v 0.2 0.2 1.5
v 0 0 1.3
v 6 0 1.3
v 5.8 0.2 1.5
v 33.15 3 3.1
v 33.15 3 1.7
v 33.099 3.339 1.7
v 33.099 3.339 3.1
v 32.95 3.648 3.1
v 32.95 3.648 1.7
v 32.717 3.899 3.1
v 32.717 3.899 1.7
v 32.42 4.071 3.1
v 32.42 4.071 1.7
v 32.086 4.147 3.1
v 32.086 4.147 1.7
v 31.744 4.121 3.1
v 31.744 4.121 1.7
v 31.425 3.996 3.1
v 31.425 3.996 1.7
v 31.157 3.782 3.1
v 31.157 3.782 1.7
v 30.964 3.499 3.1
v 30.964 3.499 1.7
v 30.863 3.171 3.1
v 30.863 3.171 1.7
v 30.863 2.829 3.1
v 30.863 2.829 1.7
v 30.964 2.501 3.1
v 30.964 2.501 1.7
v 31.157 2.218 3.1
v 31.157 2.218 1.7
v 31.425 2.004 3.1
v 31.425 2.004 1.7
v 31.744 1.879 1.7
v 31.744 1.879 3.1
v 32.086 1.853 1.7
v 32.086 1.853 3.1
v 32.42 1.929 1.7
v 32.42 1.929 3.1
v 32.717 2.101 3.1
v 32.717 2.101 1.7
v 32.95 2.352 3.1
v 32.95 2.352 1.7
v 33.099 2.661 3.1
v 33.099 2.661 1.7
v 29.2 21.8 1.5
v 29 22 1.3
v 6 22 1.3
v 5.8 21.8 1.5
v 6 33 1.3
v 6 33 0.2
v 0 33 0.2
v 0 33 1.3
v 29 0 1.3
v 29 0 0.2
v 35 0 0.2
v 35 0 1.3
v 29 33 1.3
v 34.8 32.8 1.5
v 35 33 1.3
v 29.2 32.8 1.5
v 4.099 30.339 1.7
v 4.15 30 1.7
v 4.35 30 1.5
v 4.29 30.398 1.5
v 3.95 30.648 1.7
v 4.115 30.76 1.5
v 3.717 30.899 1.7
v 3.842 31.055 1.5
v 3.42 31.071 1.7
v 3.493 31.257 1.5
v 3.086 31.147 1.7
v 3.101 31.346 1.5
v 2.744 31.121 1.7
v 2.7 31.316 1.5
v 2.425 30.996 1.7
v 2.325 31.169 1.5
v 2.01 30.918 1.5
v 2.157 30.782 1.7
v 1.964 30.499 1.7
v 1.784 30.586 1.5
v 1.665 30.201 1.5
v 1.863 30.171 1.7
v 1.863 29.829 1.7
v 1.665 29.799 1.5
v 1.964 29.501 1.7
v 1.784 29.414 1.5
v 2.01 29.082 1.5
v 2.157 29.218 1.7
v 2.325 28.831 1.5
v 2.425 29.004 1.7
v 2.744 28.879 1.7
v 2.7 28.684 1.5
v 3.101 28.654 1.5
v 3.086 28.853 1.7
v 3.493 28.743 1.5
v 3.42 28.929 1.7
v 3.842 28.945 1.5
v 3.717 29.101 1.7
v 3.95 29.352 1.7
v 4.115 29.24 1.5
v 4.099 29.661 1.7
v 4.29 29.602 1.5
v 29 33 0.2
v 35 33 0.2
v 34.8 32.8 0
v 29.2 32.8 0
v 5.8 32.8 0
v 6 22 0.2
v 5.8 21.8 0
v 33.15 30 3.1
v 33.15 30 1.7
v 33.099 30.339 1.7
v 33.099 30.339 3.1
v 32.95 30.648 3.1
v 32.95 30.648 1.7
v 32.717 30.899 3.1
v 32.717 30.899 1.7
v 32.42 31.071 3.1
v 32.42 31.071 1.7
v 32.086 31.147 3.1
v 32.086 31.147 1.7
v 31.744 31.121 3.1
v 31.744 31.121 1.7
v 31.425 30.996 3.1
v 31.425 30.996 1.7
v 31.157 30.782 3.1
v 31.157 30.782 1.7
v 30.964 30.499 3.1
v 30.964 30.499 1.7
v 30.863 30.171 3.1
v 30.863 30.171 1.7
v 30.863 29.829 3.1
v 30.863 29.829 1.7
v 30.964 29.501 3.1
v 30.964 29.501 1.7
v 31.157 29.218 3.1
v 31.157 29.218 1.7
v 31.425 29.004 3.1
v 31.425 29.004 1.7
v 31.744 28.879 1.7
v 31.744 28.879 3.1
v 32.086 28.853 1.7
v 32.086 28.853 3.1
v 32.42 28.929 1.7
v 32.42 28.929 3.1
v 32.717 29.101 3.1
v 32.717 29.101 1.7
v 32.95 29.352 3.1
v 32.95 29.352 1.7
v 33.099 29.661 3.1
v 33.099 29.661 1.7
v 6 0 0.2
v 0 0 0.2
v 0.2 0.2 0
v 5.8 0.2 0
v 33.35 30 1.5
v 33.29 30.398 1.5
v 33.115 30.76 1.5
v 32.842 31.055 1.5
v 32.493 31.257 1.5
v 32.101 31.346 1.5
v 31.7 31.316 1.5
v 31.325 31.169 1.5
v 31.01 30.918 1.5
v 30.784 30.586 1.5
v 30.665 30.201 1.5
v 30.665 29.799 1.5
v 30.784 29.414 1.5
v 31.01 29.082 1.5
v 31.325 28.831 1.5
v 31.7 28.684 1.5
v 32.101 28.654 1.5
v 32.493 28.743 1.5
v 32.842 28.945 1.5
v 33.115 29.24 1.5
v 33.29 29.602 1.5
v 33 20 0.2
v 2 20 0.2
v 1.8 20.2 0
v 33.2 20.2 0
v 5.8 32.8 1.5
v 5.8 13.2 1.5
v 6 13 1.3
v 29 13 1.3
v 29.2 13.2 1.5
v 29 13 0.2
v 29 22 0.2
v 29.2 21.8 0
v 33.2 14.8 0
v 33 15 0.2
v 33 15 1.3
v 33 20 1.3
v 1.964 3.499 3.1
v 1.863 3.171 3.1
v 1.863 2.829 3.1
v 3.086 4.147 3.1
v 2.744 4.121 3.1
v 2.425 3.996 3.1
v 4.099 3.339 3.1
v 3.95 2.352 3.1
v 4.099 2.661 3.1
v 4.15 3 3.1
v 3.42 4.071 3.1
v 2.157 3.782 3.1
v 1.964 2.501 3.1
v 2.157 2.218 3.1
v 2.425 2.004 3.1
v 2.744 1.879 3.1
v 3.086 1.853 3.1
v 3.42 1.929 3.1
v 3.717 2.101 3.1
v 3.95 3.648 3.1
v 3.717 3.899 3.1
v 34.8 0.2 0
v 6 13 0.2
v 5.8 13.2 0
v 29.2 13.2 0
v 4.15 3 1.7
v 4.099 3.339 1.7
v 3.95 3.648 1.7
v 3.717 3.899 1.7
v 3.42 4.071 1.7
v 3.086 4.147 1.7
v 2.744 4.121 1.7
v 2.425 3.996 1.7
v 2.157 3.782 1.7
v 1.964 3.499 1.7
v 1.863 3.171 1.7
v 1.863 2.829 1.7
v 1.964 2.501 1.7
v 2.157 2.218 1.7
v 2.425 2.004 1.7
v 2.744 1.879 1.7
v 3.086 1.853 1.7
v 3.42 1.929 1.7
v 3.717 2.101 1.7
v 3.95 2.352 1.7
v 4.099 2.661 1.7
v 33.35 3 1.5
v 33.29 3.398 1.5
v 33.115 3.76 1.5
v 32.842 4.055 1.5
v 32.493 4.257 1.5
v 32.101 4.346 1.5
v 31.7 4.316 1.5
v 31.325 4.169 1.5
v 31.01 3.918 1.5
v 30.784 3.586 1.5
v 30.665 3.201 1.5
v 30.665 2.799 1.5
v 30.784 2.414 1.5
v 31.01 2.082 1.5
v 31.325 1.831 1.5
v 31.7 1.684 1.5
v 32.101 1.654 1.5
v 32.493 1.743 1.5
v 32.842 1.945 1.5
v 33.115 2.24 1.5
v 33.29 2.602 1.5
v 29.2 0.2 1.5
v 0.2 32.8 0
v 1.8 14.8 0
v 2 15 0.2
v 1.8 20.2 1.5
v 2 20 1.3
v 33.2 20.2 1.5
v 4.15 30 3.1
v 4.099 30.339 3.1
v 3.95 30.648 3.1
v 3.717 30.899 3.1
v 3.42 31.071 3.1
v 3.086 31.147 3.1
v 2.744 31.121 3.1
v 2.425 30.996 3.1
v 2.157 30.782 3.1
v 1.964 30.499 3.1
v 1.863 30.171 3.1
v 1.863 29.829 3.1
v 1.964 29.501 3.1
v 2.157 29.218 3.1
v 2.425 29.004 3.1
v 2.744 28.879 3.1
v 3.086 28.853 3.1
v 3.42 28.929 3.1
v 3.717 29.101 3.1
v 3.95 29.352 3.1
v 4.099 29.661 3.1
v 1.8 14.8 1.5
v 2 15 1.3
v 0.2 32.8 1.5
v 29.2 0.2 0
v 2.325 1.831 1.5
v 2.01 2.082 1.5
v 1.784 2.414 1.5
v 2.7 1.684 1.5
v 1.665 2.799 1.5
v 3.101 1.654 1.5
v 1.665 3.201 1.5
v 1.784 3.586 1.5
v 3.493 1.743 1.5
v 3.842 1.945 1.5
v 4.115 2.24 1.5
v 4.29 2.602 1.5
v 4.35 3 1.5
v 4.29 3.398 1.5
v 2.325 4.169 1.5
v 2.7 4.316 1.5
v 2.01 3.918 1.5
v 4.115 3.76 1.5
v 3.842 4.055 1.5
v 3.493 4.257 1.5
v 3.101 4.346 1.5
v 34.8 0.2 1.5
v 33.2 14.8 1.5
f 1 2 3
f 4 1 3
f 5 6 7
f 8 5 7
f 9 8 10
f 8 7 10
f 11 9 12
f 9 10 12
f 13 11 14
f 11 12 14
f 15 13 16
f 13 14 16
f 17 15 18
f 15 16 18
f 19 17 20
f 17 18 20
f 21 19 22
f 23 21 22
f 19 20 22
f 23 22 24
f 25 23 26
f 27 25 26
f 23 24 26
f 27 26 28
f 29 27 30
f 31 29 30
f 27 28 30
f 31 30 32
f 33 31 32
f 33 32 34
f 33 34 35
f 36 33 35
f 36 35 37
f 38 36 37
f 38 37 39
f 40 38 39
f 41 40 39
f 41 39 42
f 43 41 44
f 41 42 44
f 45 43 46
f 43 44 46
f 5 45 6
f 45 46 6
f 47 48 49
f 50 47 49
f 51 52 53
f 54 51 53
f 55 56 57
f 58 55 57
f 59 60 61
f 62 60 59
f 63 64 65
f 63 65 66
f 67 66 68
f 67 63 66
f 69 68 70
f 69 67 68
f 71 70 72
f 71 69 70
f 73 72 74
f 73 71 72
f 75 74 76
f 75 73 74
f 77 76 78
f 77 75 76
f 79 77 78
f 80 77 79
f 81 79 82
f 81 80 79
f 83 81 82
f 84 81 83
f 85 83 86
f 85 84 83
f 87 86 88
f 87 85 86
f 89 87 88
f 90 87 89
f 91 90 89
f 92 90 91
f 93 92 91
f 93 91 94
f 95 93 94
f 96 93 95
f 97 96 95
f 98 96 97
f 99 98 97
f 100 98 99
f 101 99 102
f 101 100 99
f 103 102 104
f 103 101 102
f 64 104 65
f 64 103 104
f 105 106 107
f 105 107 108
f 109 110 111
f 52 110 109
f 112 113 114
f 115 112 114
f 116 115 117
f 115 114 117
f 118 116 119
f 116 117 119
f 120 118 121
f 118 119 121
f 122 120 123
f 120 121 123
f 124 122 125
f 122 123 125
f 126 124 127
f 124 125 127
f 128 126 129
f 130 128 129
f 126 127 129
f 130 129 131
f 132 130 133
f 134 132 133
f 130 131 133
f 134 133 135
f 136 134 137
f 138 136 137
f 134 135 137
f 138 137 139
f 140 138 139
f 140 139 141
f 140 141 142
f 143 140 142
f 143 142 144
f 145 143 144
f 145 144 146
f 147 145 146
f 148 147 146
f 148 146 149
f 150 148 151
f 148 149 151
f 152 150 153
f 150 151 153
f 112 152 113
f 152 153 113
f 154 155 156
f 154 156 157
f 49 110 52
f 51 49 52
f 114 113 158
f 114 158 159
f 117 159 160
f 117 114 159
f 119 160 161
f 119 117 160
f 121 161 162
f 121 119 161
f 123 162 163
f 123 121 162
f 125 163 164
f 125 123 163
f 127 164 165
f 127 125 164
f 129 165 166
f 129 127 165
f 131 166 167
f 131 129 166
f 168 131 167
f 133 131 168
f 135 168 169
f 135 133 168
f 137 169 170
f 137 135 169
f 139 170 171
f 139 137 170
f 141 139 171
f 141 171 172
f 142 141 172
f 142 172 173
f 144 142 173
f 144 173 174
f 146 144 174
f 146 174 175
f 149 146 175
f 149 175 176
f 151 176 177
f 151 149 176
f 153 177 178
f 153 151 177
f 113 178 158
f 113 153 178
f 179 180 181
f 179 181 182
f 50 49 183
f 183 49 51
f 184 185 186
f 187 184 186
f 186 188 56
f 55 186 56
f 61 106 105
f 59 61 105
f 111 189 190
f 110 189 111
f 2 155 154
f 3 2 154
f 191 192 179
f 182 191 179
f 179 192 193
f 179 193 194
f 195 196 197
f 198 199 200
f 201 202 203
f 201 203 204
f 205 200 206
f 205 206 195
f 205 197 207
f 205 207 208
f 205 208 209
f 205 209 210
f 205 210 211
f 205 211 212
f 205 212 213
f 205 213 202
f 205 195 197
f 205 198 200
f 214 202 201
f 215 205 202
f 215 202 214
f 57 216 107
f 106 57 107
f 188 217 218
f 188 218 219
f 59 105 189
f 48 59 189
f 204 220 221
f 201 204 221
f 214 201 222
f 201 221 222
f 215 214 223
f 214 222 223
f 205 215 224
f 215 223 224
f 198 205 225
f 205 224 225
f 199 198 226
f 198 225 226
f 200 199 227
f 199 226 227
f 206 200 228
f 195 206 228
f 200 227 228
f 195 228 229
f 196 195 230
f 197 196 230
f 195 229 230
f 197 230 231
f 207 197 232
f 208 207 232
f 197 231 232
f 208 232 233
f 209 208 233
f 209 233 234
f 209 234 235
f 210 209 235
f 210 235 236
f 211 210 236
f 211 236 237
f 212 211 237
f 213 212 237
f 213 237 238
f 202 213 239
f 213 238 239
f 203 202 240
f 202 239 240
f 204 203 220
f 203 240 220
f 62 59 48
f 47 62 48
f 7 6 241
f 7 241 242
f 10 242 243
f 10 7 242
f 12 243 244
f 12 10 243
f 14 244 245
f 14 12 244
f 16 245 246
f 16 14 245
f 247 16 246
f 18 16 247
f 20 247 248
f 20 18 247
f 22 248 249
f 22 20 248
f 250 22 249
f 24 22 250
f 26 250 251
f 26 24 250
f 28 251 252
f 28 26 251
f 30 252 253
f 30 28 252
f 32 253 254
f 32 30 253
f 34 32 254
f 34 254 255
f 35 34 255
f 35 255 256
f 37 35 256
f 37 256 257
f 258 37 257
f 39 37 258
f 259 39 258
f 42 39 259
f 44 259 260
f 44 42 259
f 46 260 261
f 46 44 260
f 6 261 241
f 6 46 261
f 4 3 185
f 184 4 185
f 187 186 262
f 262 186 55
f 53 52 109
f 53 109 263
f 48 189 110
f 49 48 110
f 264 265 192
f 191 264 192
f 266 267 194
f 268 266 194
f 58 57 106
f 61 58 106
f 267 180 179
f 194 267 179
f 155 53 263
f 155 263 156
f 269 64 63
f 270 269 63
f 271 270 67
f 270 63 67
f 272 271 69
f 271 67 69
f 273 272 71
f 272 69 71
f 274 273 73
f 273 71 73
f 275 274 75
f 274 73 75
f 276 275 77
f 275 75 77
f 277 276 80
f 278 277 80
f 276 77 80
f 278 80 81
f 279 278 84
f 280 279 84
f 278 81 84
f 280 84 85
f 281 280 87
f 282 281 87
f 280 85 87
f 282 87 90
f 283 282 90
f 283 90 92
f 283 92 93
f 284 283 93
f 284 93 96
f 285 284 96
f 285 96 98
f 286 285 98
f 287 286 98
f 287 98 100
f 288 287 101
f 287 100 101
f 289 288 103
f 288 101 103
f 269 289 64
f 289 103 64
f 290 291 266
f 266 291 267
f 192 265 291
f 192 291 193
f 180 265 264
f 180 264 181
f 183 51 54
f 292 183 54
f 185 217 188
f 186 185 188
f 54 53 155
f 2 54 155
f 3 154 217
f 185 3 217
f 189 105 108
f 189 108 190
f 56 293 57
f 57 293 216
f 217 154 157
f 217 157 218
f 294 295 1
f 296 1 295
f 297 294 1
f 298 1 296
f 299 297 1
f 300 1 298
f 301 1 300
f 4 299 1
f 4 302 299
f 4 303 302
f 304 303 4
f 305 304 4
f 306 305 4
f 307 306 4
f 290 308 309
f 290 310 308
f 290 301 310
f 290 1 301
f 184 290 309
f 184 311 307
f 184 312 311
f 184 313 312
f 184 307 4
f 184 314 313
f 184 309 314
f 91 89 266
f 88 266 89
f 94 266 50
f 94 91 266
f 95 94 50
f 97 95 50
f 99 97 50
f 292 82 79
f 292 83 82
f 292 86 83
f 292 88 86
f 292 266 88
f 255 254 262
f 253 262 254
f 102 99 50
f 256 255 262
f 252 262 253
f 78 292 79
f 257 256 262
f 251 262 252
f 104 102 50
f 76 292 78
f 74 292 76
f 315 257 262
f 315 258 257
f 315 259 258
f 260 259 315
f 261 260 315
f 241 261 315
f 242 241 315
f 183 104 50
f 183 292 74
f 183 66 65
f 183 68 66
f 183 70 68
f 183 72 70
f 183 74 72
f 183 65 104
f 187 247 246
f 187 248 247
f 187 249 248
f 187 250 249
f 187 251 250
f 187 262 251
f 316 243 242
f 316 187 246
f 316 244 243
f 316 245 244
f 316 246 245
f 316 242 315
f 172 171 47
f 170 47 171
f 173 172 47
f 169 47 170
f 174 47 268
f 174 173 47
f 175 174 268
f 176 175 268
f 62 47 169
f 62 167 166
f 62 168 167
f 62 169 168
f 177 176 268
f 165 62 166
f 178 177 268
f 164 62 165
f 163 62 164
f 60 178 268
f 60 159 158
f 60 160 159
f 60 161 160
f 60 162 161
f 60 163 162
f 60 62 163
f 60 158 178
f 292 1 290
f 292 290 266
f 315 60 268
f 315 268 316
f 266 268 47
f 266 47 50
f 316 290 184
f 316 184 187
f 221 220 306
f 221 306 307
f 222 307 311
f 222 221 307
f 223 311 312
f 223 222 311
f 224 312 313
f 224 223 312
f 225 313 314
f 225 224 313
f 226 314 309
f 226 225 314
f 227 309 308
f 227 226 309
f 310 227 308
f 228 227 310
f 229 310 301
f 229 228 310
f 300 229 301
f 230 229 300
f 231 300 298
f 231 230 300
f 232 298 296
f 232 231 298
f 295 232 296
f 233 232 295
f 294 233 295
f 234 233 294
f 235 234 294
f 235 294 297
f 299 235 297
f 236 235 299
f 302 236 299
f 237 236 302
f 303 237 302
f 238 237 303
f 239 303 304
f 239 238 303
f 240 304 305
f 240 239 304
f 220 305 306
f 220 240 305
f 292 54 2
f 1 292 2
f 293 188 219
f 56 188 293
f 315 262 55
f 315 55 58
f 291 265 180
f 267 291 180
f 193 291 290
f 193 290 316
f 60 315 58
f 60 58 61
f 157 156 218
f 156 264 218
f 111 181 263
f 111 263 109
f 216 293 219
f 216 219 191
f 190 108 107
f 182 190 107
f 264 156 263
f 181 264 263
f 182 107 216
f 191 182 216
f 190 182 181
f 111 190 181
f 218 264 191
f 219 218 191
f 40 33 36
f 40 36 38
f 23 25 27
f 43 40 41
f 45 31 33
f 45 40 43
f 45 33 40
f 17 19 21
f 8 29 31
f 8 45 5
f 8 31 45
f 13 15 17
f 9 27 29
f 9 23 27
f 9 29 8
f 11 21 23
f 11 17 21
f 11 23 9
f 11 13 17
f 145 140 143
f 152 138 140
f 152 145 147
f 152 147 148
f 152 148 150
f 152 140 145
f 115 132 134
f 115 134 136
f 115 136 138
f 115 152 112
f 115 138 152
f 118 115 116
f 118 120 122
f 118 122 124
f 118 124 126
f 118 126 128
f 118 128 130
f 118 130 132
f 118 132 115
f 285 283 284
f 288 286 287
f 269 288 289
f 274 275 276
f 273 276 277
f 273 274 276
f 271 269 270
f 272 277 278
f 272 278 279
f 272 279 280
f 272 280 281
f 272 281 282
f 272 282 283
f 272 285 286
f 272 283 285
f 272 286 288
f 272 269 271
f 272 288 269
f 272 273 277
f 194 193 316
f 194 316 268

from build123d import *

# Parameters (mm, degrees)
SKETCH_W        = 31
SKETCH_H        = 5
PAD_DEPTH       = 1.5
SKETCH001_R     = 1.15
PAD001_DEPTH    = 1.6
CHAMFER_SIZE    = 0.2
CHAMFER001_SIZE = 0.2


with BuildPart() as part:
    # Sketch → Pad (new body)
    with BuildSketch(Plane.XY):
        Polygon((35, 0), (35, 33), (29, 33), (29, 22), (6, 22), (6, 33), (0, 33), (0, 0), (6, 0), (6, 13), (29, 13), (29, 0), align=None)
        with Locations((17.5, 17.5)):
            Rectangle(SKETCH_W, SKETCH_H, mode=Mode.SUBTRACT)
    extrude(amount=PAD_DEPTH)

    # Sketch001 → Pad001 (new body)
    with BuildSketch(Plane.XY.offset(1.5)):
        with Locations((3, 30)):
            Circle(SKETCH001_R)
        with Locations((32, 30)):
            Circle(SKETCH001_R)
        with Locations((32, 3)):
            Circle(SKETCH001_R)
        with Locations((3, 3)):
            Circle(SKETCH001_R)
    extrude(amount=PAD001_DEPTH)

    # Chamfer
    chamfer_edges = [part.edges().sort_by_distance(p)[0] for p in [
        (0, 16.5, 1.5),
        (3, 33, 1.5),
        (3, 0, 1.5),
        (6, 27.5, 1.5),
        (6, 6.5, 1.5),
        (17.5, 22, 1.5),
        (17.5, 13, 1.5),
        (29, 27.5, 1.5),
        (29, 6.5, 1.5),
        (32, 33, 1.5),
        (32, 0, 1.5),
        (35, 16.5, 1.5),
        (1.85, 3, 1.5),
        (30.85, 3, 1.5),
        (1.85, 30, 1.5),
        (30.85, 30, 1.5),
        (2, 17.5, 1.5),
        (17.5, 20, 1.5),
        (17.5, 15, 1.5),
        (33, 17.5, 1.5),
    ]]
    chamfer(chamfer_edges, length=CHAMFER_SIZE)

    # Chamfer001
    chamfer001_edges = [part.edges().sort_by_distance(p)[0] for p in [
        (0, 16.5, 0),
        (3, 0, 0),
        (6, 6.5, 0),
        (17.5, 13, 0),
        (29, 6.5, 0),
        (32, 0, 0),
        (35, 16.5, 0),
        (32, 33, 0),
        (29, 27.5, 0),
        (17.5, 22, 0),
        (6, 27.5, 0),
        (3, 33, 0),
        (2, 17.5, 0),
        (17.5, 20, 0),
        (33, 17.5, 0),
        (17.5, 15, 0),
    ]]
    chamfer(chamfer001_edges, length=CHAMFER001_SIZE)


solid = part.part
